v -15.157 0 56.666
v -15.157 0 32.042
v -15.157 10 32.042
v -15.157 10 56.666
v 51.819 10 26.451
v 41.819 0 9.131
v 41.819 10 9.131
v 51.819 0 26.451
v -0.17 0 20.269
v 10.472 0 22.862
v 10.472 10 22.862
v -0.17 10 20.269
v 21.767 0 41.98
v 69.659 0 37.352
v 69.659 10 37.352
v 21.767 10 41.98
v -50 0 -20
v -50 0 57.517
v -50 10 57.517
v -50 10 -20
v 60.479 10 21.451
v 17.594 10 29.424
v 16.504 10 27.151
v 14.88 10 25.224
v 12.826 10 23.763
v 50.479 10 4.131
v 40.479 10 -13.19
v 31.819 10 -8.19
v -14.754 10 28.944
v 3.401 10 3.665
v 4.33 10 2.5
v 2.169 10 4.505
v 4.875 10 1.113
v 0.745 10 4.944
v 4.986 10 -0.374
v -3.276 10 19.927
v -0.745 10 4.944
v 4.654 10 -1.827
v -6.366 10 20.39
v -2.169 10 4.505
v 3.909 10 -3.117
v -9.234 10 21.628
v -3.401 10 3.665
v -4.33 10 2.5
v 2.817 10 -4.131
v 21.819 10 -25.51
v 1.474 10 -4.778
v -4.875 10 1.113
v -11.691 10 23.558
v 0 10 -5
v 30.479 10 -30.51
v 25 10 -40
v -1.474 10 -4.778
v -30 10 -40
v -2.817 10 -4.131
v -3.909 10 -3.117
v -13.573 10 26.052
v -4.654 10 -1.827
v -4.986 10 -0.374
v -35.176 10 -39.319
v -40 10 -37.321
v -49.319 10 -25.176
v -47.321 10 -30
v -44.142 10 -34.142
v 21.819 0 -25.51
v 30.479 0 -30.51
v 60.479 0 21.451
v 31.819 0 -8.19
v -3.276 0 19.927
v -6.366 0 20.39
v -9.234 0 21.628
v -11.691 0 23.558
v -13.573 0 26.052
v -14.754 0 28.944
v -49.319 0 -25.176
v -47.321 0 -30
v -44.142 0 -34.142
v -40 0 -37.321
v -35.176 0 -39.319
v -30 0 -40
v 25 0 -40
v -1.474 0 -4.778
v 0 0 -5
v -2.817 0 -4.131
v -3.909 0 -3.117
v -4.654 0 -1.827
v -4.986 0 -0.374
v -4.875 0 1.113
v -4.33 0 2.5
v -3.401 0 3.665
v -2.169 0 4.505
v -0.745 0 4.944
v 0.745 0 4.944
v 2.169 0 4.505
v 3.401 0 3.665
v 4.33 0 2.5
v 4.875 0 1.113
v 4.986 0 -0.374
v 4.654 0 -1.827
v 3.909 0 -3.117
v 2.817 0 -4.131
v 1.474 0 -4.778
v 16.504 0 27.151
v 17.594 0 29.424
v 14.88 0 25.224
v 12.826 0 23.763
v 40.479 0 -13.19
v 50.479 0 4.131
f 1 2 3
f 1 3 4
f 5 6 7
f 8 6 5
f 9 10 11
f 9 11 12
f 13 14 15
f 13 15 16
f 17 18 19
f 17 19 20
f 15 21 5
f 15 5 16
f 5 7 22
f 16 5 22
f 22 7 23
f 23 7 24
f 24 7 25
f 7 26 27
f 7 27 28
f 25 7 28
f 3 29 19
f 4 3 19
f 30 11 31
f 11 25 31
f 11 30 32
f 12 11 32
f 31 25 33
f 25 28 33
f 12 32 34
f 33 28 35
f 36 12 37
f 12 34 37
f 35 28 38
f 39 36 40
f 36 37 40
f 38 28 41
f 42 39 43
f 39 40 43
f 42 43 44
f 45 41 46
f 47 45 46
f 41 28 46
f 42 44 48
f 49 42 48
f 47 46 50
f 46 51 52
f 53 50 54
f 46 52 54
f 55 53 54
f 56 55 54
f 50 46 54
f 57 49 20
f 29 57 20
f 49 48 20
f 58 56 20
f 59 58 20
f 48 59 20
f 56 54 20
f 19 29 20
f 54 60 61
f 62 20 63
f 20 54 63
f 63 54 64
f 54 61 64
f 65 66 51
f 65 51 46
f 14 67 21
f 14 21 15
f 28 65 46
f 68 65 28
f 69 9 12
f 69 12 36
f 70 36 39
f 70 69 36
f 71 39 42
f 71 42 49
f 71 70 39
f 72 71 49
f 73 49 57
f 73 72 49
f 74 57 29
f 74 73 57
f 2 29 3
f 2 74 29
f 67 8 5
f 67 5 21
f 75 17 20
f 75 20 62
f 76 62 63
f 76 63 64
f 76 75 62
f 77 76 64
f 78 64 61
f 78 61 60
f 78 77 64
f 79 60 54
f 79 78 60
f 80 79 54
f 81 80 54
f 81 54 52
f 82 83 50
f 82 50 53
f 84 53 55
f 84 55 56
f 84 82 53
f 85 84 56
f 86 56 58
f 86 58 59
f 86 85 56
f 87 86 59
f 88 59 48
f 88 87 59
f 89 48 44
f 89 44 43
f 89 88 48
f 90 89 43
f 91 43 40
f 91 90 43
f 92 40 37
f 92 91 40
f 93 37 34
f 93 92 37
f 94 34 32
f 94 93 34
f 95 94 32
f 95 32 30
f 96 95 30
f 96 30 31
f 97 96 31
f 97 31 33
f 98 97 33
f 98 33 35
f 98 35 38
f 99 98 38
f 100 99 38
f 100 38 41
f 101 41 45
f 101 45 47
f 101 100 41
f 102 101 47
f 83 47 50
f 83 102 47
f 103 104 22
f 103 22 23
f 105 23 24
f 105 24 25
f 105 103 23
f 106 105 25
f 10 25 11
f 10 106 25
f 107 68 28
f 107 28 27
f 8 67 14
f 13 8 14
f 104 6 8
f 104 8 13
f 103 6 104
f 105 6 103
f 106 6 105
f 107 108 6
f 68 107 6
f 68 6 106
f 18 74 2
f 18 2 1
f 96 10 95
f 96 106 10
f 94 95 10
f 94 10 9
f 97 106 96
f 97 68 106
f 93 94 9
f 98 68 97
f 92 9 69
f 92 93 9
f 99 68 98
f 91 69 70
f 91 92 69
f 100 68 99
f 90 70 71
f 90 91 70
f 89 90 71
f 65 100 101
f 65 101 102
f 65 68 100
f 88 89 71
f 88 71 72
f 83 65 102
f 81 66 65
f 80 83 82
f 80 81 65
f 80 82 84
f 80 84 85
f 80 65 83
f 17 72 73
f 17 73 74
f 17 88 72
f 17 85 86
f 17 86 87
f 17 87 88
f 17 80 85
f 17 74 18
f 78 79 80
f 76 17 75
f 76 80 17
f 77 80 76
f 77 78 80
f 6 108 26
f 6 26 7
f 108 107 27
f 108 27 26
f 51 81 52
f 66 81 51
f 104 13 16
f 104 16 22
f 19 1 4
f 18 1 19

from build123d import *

# Parameters (mm, degrees)
SKETCH1_R           = 5
BOSS_EXTRUDE1_DEPTH = 10


# Read off the part's stored shape, not the designer's step: Imported1
with BuildPart() as part:
    # Sketch1 → Boss-Extrude1 (new body)
    with BuildSketch(Plane(origin=(0, 0, 0), x_dir=(1, 0, 0), z_dir=(0, 1, 0))):
        with BuildLine():
            Line((-30, 40), (25, 40))
            Line((25, 40), (30.478825766, 30.510395408))
            Line((30.478825766, 30.510395408), (21.818571728, 25.510395408))
            Line((21.818571728, 25.510395408), (31.818571728, 8.189887333))
            Line((31.818571728, 8.189887333), (40.478825766, 13.189887333))
            Line((40.478825766, 13.189887333), (50.478825766, -4.130620743))
            Line((50.478825766, -4.130620743), (41.818571728, -9.130620743))
            Line((41.818571728, -9.130620743), (51.818571728, -26.451128819))
            Line((51.818571728, -26.451128819), (60.478825766, -21.451128819))
            Line((60.478825766, -21.451128819), (69.659283069, -37.352147305))
            Line((69.659283069, -37.352147305), (21.766908157, -41.979610283))
            Line((21.766908157, -41.979610283), (19.644977926, -35.595148029))
            Line((19.644977926, -35.595148029), (17.593976856, -29.424097387))
            ThreePointArc((17.593976856, -29.424097387), (14.880225334, -25.223606168), (10.471929596, -22.862355971))
            Line((10.471929596, -22.862355971), (-0.170430849, -20.268984513))
            ThreePointArc((-0.170430849, -20.268984513), (-10.525131482, -22.513169462), (-15.157047212, -32.042154085))
            Line((-15.157047212, -32.042154085), (-15.157047212, -56.665547585))
            Line((-15.157047212, -56.665547585), (-50, -57.51739948))
            Line((-50, -57.51739948), (-50, -33.474160509))
            Line((-50, -33.474160509), (-50, 20))
            ThreePointArc((-50, 20), (-44.142135624, 34.142135624), (-30, 40))
        make_face()
        with Locations(Location((0, 0, 0), (0, 0, 90))):
            Circle(SKETCH1_R, mode=Mode.SUBTRACT)
    extrude(amount=BOSS_EXTRUDE1_DEPTH)


solid = part.part
